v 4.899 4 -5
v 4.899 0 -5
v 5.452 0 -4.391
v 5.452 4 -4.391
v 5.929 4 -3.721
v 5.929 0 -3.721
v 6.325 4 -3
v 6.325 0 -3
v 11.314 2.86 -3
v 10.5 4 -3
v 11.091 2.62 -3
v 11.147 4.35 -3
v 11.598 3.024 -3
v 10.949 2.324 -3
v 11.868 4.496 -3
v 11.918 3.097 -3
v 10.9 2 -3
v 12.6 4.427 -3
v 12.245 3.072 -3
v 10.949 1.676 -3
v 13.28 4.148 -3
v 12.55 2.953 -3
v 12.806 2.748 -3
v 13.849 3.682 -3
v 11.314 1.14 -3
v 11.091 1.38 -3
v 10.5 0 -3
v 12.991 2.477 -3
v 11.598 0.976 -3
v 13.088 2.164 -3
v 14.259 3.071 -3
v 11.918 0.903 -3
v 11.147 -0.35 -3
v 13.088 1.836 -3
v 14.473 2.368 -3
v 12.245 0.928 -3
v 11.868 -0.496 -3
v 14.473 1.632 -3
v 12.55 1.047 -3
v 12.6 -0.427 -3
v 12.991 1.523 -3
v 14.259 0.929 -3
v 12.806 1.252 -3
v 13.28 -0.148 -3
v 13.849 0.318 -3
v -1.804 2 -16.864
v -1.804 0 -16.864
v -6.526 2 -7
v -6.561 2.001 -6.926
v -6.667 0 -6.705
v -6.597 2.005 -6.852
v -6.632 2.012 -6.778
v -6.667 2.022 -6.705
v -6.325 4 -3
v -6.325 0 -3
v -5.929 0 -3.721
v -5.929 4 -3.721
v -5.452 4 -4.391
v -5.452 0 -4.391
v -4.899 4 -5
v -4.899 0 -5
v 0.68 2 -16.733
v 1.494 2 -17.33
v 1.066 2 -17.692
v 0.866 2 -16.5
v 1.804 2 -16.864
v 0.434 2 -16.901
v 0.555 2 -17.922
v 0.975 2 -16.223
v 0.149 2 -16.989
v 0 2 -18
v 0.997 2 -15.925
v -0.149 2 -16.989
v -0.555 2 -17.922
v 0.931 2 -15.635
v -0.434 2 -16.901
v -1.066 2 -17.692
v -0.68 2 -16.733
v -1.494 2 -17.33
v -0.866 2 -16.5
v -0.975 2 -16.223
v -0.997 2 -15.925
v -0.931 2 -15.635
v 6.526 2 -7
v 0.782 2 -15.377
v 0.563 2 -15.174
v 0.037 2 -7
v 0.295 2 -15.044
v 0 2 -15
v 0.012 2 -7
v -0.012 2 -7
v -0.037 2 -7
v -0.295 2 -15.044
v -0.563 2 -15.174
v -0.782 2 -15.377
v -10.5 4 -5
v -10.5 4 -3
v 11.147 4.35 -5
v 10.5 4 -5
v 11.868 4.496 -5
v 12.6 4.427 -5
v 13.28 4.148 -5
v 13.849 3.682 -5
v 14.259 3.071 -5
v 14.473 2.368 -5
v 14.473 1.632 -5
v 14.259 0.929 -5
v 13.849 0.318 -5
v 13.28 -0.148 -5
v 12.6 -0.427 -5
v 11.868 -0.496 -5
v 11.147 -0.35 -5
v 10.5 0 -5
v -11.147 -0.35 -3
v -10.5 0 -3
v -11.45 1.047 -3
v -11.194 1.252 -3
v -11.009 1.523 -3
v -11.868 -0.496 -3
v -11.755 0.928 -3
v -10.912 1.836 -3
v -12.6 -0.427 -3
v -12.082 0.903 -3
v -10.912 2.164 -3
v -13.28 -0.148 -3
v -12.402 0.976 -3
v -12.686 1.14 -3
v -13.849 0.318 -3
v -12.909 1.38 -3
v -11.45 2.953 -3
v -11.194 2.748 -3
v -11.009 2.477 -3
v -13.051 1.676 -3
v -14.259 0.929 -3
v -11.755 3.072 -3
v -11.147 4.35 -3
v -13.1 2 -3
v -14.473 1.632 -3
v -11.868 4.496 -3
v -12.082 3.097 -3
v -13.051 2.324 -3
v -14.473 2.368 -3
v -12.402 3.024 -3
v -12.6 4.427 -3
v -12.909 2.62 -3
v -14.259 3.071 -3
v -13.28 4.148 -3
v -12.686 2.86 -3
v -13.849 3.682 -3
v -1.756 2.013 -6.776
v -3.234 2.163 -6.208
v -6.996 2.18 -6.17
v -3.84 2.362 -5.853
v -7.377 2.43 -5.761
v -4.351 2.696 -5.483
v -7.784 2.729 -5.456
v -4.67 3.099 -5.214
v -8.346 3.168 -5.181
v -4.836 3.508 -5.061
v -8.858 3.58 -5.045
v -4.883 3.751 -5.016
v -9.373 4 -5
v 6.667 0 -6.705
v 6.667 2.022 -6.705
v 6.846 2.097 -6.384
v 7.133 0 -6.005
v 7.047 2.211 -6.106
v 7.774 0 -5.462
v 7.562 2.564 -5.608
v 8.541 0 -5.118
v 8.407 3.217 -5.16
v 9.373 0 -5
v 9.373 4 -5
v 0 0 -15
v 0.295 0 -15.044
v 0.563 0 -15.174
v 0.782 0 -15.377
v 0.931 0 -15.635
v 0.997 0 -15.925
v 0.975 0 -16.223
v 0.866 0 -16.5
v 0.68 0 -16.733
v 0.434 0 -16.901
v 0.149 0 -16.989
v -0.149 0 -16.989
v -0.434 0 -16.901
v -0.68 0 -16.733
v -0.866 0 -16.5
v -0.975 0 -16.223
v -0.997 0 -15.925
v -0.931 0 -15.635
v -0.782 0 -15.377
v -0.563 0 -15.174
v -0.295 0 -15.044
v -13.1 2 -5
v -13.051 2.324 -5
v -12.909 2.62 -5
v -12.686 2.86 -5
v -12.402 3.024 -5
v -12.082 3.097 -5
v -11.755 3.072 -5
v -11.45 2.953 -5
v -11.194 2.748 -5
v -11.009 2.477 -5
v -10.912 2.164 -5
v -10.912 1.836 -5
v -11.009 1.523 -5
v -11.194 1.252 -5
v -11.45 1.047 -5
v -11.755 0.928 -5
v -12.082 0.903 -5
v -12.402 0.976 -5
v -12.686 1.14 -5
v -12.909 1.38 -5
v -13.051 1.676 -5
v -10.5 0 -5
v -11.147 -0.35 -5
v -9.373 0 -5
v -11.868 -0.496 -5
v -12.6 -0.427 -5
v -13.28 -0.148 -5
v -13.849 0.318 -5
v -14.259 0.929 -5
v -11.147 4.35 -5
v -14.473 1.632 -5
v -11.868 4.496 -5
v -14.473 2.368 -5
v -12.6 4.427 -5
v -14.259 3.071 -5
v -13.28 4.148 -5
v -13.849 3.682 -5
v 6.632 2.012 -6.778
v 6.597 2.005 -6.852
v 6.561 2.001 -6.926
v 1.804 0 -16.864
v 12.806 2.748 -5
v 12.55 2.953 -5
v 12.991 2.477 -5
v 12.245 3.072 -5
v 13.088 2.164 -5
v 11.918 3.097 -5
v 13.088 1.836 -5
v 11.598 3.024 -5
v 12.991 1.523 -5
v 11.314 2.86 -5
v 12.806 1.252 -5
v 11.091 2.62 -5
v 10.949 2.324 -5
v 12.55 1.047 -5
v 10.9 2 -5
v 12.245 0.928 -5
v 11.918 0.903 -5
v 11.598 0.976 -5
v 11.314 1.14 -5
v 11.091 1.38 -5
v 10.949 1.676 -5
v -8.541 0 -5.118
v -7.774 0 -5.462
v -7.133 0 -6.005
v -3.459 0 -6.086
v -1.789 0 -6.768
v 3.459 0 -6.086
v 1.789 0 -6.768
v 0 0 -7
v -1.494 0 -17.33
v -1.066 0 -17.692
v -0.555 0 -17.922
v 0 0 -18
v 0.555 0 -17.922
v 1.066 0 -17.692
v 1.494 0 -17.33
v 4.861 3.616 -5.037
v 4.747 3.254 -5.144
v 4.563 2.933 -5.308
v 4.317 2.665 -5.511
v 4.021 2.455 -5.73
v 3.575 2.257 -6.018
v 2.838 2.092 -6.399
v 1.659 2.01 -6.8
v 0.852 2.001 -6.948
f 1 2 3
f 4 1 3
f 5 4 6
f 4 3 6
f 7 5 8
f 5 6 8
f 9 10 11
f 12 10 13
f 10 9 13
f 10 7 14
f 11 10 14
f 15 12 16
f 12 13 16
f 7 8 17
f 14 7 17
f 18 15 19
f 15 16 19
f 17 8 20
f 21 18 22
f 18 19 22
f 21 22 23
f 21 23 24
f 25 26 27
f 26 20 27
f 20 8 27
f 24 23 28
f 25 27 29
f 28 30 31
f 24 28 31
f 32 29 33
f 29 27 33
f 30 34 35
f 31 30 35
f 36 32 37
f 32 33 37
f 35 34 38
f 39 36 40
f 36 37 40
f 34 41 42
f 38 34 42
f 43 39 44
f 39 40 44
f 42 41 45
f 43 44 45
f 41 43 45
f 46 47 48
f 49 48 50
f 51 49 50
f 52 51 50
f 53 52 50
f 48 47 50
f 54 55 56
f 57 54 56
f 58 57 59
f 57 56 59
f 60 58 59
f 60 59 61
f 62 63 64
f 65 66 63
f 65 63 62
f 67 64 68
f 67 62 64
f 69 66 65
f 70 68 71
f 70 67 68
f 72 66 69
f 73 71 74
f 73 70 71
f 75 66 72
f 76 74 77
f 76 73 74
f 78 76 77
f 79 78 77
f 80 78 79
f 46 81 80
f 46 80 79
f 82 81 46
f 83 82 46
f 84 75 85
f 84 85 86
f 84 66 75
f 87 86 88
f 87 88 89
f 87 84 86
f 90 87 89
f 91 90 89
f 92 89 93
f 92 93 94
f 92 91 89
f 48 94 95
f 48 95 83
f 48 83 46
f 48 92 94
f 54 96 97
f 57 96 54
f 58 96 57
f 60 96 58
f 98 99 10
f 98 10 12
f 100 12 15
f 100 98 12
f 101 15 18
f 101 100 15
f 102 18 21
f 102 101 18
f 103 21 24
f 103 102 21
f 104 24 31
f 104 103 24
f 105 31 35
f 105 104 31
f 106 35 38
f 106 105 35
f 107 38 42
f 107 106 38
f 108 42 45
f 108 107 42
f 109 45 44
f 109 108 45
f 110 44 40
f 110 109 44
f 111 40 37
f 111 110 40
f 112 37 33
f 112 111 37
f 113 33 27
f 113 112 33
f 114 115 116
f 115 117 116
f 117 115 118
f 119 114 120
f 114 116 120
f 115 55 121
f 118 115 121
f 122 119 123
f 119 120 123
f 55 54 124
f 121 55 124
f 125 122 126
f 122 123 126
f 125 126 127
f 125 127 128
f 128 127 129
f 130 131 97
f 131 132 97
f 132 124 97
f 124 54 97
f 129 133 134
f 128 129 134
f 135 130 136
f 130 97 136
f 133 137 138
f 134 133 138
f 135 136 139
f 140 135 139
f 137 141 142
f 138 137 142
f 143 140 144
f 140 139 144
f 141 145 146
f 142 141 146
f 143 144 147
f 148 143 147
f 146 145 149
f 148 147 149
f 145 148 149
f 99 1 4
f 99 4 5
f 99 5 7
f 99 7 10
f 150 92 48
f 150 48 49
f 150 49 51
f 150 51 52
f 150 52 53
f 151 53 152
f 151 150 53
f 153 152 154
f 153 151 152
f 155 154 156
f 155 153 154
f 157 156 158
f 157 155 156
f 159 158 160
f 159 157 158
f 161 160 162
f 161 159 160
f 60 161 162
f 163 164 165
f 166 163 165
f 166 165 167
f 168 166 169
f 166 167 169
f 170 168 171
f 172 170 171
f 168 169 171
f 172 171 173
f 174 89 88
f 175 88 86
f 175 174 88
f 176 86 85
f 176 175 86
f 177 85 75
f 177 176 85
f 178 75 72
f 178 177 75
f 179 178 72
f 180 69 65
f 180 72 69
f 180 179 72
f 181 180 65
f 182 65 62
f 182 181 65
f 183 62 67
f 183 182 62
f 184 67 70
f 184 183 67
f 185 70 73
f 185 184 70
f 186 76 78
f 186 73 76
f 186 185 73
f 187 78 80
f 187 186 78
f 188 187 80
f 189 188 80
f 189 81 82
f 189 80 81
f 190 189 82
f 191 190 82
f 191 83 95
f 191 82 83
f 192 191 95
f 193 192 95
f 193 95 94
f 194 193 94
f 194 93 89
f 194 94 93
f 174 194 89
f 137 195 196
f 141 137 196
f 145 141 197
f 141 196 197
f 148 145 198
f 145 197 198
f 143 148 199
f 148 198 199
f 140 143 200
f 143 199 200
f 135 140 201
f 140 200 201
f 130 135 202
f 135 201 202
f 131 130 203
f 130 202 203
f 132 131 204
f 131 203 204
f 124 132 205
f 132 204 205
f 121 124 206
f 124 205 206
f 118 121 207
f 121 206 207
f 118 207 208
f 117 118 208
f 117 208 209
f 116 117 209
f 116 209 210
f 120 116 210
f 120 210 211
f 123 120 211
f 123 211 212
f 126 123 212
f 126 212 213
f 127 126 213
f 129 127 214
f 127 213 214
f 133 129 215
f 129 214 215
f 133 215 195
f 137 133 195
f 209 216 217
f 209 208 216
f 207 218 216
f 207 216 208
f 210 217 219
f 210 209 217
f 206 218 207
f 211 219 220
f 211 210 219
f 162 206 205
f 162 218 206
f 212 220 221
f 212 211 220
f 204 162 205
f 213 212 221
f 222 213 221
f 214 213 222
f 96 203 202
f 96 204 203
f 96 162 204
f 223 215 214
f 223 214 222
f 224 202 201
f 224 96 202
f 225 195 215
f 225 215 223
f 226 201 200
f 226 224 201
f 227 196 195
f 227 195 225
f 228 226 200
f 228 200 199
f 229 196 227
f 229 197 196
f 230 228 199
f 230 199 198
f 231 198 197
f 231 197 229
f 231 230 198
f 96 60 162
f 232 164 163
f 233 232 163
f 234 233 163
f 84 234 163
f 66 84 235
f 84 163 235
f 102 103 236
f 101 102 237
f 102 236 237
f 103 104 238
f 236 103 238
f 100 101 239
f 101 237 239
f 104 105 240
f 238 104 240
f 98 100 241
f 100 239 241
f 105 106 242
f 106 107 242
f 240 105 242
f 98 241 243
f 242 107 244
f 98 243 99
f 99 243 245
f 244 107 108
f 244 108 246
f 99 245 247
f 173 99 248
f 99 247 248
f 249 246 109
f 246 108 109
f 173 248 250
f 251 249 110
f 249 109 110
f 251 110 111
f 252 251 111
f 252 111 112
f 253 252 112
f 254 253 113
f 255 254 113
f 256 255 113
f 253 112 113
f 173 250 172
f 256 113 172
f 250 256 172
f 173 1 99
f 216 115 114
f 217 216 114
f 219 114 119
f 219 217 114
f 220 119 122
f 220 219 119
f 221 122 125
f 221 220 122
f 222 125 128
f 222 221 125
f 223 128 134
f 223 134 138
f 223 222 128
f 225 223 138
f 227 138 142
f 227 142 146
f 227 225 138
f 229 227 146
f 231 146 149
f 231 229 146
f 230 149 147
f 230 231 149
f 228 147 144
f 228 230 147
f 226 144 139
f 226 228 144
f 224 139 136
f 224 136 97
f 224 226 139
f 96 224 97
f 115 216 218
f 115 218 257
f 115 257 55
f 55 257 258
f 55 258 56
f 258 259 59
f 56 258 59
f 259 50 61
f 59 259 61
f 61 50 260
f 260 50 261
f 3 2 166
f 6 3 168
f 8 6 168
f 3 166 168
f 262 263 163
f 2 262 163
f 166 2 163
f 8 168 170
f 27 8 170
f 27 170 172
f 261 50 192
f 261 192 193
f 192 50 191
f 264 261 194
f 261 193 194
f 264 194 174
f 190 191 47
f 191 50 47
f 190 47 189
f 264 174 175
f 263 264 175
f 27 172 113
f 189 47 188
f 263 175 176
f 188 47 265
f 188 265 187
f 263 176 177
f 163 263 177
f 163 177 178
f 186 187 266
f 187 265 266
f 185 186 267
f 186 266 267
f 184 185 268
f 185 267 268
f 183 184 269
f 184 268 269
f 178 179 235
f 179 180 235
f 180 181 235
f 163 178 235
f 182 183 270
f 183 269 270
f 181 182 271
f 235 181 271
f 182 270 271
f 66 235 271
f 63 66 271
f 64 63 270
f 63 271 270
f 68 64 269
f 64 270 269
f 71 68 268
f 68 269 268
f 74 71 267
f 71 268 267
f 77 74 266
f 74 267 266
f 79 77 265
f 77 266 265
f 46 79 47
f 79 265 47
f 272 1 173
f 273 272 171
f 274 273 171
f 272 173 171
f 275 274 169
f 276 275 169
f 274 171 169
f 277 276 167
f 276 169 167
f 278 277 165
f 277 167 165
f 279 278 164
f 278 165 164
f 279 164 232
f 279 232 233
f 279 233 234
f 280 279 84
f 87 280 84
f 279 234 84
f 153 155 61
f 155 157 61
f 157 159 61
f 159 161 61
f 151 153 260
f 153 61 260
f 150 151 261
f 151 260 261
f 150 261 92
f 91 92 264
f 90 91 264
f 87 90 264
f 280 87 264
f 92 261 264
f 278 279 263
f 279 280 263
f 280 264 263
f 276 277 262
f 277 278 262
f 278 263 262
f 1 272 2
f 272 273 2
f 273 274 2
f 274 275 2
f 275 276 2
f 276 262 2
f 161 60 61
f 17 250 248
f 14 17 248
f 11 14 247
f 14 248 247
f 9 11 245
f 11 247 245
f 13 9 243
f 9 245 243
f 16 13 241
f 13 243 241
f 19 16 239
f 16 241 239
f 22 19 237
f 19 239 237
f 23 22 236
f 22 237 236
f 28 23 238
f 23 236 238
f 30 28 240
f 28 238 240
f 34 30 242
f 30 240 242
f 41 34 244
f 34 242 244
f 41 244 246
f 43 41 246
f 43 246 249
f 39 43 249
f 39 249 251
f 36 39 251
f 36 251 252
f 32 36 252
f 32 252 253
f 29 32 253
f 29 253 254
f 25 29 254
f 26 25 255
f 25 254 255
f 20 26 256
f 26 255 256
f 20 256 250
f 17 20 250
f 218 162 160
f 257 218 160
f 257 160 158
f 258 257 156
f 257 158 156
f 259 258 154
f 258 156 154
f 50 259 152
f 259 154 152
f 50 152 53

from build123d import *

# Parameters (mm, degrees)
SKETCH1_R           = 2
SKETCH1_R_2         = 1
BOSS_EXTRUDE1_DEPTH = 4
SKETCH2_R           = 1.1
CUT_EXTRUDE1_DEPTH  = 2
SKETCH3_W           = 14.966629548
SKETCH3_H           = 2
CUT_EXTRUDE2_DEPTH  = 23
FILLET1_R           = 3
FILLET2_R           = 2
FILLET3_R           = 2
SKETCH4_R           = 2.5
SKETCH4_R_2         = 1.1
BOSS_EXTRUDE2_DEPTH = 2


with BuildPart() as part:
    # Sketch1 → Boss-Extrude1 (new body)
    # profile 1 of 9: a face of its own
    with BuildSketch(Plane(origin=(0, 0, 0), x_dir=(1, 0, 0), z_dir=(0, 1, 0))):
        with BuildLine():
            Line((-14, 3), (-8.485281374, 3))
            ThreePointArc((-8.485281374, 3), (-8.04667731, 4.031250956), (-7.483314774, 5))
            Line((-7.483314774, 5), (-14, 5))
            Line((-14, 5), (-14, 3))
        make_face()
    # profile 2 of 9: a face of its own
    with BuildSketch(Plane(origin=(0, 0, 0), x_dir=(1, 0, 0), z_dir=(0, 1, 0))):
        with BuildLine():
            ThreePointArc((-7.483314774, 5), (-8.04667731, 4.031250956), (-8.485281374, 3))
            Line((-8.485281374, 3), (-6.32455532, 3))
            ThreePointArc((-6.32455532, 3), (-5.700169593, 4.063012013), (-4.898979486, 5))
            Line((-4.898979486, 5), (-7.483314774, 5))
        make_face()
    # profile 3 of 9: a face of its own
    with BuildSketch(Plane(origin=(0, 0, 0), x_dir=(1, 0, 0), z_dir=(0, 1, 0))):
        with BuildLine():
            ThreePointArc((4.898979486, 5), (5.700169593, 4.063012013), (6.32455532, 3))
            Line((6.32455532, 3), (8.485281374, 3))
            ThreePointArc((8.485281374, 3), (8.04667731, 4.031250956), (7.483314774, 5))
            Line((7.483314774, 5), (4.898979486, 5))
        make_face()
    # profile 4 of 9: a face of its own
    with BuildSketch(Plane(origin=(0, 0, 0), x_dir=(1, 0, 0), z_dir=(0, 1, 0))):
        with BuildLine():
            ThreePointArc((7.483314774, 5), (0, 9), (-7.483314774, 5))
            Line((-7.483314774, 5), (-4.898979486, 5))
            ThreePointArc((-4.898979486, 5), (0, 7), (4.898979486, 5))
            Line((4.898979486, 5), (7.483314774, 5))
        make_face()
    # profile 5 of 9: a face of its own
    with BuildSketch(Plane(origin=(0, 0, 0), x_dir=(1, 0, 0), z_dir=(0, 1, 0))):
        with BuildLine():
            Line((-1.803943959, 16.863589134), (-7.483314774, 5))
            ThreePointArc((-7.483314774, 5), (0, 9), (7.483314774, 5))
            Line((7.483314774, 5), (1.803943959, 16.863589134))
            ThreePointArc((1.803943959, 16.863589134), (1.950370211, 16.44278216), (2, 16))
            ThreePointArc((2, 16), (-0.44278216, 14.049629789), (-1.803943959, 16.863589134))
        make_face()
    # profile 6 of 9: a face of its own
    with BuildSketch(Plane(origin=(0, 0, 0), x_dir=(1, 0, 0), z_dir=(0, 1, 0))):
        with BuildLine():
            Line((14, 5), (7.483314774, 5))
            ThreePointArc((7.483314774, 5), (8.04667731, 4.031250956), (8.485281374, 3))
            Line((8.485281374, 3), (14, 3))
            Line((14, 3), (14, 5))
        make_face()
    # profile 7 of 9: a face of its own
    with BuildSketch(Plane(origin=(0, 0, 0), x_dir=(1, 0, 0), z_dir=(0, 1, 0))):
        with BuildLine():
            ThreePointArc((-7.483314774, 5), (-8.04667731, 4.031250956), (-8.485281374, 3))
            Line((-8.485281374, 3), (-6.32455532, 3))
            ThreePointArc((-6.32455532, 3), (-5.700169593, 4.063012013), (-4.898979486, 5))
            Line((-4.898979486, 5), (-7.483314774, 5))
        make_face()
    # profile 8 of 9: a face of its own
    with BuildSketch(Plane(origin=(0, 0, 0), x_dir=(1, 0, 0), z_dir=(0, 1, 0))):
        with BuildLine():
            ThreePointArc((4.898979486, 5), (5.700169593, 4.063012013), (6.32455532, 3))
            Line((6.32455532, 3), (8.485281374, 3))
            ThreePointArc((8.485281374, 3), (8.04667731, 4.031250956), (7.483314774, 5))
            Line((7.483314774, 5), (4.898979486, 5))
        make_face()
    # profile 9 of 9: a face of its own
    with BuildSketch(Plane(origin=(0, 0, 0), x_dir=(1, 0, 0), z_dir=(0, 1, 0))):
        with Locations((0, 16)):
            Circle(SKETCH1_R)
        with Locations(Location((0, 16, 0), (0, 0, 270))):
            Circle(SKETCH1_R_2, mode=Mode.SUBTRACT)
    extrude(amount=BOSS_EXTRUDE1_DEPTH)

    # Sketch2 → Cut-Extrude1 (cut)
    with BuildSketch(Plane(origin=(0, 0, -5), x_dir=(-1, 0, 0), z_dir=(0, 0, -1))):
        with Locations((-12, 2)):
            Circle(SKETCH2_R)
        with Locations((12, 2)):
            Circle(SKETCH2_R)
    extrude(amount=-CUT_EXTRUDE1_DEPTH, mode=Mode.SUBTRACT)

    # Sketch3 → Cut-Extrude2 (cut)
    with BuildSketch(Plane(origin=(0, 0, -5), x_dir=(-1, 0, 0), z_dir=(0, 0, -1))):
        with Locations((0, 3)):
            Rectangle(SKETCH3_W, SKETCH3_H)
    extrude(amount=CUT_EXTRUDE2_DEPTH, mode=Mode.SUBTRACT)

    # Fillet1
    fillet1_edges = [part.edges().sort_by_distance(p)[0] for p in [
        (-7.483314774, 1, -5),
        (7.483314774, 1, -5),
    ]]
    fillet(fillet1_edges, radius=FILLET1_R)

    # Fillet2
    fillet2_edges = [part.edges().sort_by_distance(p)[0] for p in [
        (-14, 0, -4),
        (14, 0, -4),
        (14, 4, -4),
        (-14, 4, -4),
    ]]
    fillet(fillet2_edges, radius=FILLET2_R - 0.0001)  # a hair under: the kernel refuses the full size

    # Fillet3
    fillet3_edges = [part.edges().sort_by_distance(p)[0] for p in [
        (7.13608574, 2, -5),
        (-7.13608574, 2, -5),
    ]]
    fillet(fillet3_edges, radius=FILLET3_R - 0.0001)  # a hair under: the kernel refuses the full size

    # Sketch4 → Boss-Extrude2 (add)
    # profile 1 of 2: a face of its own
    with BuildSketch(Plane(origin=(0, 0, -5), x_dir=(-1, 0, 0), z_dir=(0, 0, -1))):
        with Locations((12, 2)):
            Circle(SKETCH4_R)
        with Locations((12, 2)):
            Circle(SKETCH4_R_2, mode=Mode.SUBTRACT)
    # profile 2 of 2: a face of its own
    with BuildSketch(Plane(origin=(0, 0, -5), x_dir=(-1, 0, 0), z_dir=(0, 0, -1))):
        with Locations((-12, 2)):
            Circle(SKETCH4_R)
        with Locations((-12, 2)):
            Circle(SKETCH4_R_2, mode=Mode.SUBTRACT)
    extrude(amount=-BOSS_EXTRUDE2_DEPTH)


solid = part.part
